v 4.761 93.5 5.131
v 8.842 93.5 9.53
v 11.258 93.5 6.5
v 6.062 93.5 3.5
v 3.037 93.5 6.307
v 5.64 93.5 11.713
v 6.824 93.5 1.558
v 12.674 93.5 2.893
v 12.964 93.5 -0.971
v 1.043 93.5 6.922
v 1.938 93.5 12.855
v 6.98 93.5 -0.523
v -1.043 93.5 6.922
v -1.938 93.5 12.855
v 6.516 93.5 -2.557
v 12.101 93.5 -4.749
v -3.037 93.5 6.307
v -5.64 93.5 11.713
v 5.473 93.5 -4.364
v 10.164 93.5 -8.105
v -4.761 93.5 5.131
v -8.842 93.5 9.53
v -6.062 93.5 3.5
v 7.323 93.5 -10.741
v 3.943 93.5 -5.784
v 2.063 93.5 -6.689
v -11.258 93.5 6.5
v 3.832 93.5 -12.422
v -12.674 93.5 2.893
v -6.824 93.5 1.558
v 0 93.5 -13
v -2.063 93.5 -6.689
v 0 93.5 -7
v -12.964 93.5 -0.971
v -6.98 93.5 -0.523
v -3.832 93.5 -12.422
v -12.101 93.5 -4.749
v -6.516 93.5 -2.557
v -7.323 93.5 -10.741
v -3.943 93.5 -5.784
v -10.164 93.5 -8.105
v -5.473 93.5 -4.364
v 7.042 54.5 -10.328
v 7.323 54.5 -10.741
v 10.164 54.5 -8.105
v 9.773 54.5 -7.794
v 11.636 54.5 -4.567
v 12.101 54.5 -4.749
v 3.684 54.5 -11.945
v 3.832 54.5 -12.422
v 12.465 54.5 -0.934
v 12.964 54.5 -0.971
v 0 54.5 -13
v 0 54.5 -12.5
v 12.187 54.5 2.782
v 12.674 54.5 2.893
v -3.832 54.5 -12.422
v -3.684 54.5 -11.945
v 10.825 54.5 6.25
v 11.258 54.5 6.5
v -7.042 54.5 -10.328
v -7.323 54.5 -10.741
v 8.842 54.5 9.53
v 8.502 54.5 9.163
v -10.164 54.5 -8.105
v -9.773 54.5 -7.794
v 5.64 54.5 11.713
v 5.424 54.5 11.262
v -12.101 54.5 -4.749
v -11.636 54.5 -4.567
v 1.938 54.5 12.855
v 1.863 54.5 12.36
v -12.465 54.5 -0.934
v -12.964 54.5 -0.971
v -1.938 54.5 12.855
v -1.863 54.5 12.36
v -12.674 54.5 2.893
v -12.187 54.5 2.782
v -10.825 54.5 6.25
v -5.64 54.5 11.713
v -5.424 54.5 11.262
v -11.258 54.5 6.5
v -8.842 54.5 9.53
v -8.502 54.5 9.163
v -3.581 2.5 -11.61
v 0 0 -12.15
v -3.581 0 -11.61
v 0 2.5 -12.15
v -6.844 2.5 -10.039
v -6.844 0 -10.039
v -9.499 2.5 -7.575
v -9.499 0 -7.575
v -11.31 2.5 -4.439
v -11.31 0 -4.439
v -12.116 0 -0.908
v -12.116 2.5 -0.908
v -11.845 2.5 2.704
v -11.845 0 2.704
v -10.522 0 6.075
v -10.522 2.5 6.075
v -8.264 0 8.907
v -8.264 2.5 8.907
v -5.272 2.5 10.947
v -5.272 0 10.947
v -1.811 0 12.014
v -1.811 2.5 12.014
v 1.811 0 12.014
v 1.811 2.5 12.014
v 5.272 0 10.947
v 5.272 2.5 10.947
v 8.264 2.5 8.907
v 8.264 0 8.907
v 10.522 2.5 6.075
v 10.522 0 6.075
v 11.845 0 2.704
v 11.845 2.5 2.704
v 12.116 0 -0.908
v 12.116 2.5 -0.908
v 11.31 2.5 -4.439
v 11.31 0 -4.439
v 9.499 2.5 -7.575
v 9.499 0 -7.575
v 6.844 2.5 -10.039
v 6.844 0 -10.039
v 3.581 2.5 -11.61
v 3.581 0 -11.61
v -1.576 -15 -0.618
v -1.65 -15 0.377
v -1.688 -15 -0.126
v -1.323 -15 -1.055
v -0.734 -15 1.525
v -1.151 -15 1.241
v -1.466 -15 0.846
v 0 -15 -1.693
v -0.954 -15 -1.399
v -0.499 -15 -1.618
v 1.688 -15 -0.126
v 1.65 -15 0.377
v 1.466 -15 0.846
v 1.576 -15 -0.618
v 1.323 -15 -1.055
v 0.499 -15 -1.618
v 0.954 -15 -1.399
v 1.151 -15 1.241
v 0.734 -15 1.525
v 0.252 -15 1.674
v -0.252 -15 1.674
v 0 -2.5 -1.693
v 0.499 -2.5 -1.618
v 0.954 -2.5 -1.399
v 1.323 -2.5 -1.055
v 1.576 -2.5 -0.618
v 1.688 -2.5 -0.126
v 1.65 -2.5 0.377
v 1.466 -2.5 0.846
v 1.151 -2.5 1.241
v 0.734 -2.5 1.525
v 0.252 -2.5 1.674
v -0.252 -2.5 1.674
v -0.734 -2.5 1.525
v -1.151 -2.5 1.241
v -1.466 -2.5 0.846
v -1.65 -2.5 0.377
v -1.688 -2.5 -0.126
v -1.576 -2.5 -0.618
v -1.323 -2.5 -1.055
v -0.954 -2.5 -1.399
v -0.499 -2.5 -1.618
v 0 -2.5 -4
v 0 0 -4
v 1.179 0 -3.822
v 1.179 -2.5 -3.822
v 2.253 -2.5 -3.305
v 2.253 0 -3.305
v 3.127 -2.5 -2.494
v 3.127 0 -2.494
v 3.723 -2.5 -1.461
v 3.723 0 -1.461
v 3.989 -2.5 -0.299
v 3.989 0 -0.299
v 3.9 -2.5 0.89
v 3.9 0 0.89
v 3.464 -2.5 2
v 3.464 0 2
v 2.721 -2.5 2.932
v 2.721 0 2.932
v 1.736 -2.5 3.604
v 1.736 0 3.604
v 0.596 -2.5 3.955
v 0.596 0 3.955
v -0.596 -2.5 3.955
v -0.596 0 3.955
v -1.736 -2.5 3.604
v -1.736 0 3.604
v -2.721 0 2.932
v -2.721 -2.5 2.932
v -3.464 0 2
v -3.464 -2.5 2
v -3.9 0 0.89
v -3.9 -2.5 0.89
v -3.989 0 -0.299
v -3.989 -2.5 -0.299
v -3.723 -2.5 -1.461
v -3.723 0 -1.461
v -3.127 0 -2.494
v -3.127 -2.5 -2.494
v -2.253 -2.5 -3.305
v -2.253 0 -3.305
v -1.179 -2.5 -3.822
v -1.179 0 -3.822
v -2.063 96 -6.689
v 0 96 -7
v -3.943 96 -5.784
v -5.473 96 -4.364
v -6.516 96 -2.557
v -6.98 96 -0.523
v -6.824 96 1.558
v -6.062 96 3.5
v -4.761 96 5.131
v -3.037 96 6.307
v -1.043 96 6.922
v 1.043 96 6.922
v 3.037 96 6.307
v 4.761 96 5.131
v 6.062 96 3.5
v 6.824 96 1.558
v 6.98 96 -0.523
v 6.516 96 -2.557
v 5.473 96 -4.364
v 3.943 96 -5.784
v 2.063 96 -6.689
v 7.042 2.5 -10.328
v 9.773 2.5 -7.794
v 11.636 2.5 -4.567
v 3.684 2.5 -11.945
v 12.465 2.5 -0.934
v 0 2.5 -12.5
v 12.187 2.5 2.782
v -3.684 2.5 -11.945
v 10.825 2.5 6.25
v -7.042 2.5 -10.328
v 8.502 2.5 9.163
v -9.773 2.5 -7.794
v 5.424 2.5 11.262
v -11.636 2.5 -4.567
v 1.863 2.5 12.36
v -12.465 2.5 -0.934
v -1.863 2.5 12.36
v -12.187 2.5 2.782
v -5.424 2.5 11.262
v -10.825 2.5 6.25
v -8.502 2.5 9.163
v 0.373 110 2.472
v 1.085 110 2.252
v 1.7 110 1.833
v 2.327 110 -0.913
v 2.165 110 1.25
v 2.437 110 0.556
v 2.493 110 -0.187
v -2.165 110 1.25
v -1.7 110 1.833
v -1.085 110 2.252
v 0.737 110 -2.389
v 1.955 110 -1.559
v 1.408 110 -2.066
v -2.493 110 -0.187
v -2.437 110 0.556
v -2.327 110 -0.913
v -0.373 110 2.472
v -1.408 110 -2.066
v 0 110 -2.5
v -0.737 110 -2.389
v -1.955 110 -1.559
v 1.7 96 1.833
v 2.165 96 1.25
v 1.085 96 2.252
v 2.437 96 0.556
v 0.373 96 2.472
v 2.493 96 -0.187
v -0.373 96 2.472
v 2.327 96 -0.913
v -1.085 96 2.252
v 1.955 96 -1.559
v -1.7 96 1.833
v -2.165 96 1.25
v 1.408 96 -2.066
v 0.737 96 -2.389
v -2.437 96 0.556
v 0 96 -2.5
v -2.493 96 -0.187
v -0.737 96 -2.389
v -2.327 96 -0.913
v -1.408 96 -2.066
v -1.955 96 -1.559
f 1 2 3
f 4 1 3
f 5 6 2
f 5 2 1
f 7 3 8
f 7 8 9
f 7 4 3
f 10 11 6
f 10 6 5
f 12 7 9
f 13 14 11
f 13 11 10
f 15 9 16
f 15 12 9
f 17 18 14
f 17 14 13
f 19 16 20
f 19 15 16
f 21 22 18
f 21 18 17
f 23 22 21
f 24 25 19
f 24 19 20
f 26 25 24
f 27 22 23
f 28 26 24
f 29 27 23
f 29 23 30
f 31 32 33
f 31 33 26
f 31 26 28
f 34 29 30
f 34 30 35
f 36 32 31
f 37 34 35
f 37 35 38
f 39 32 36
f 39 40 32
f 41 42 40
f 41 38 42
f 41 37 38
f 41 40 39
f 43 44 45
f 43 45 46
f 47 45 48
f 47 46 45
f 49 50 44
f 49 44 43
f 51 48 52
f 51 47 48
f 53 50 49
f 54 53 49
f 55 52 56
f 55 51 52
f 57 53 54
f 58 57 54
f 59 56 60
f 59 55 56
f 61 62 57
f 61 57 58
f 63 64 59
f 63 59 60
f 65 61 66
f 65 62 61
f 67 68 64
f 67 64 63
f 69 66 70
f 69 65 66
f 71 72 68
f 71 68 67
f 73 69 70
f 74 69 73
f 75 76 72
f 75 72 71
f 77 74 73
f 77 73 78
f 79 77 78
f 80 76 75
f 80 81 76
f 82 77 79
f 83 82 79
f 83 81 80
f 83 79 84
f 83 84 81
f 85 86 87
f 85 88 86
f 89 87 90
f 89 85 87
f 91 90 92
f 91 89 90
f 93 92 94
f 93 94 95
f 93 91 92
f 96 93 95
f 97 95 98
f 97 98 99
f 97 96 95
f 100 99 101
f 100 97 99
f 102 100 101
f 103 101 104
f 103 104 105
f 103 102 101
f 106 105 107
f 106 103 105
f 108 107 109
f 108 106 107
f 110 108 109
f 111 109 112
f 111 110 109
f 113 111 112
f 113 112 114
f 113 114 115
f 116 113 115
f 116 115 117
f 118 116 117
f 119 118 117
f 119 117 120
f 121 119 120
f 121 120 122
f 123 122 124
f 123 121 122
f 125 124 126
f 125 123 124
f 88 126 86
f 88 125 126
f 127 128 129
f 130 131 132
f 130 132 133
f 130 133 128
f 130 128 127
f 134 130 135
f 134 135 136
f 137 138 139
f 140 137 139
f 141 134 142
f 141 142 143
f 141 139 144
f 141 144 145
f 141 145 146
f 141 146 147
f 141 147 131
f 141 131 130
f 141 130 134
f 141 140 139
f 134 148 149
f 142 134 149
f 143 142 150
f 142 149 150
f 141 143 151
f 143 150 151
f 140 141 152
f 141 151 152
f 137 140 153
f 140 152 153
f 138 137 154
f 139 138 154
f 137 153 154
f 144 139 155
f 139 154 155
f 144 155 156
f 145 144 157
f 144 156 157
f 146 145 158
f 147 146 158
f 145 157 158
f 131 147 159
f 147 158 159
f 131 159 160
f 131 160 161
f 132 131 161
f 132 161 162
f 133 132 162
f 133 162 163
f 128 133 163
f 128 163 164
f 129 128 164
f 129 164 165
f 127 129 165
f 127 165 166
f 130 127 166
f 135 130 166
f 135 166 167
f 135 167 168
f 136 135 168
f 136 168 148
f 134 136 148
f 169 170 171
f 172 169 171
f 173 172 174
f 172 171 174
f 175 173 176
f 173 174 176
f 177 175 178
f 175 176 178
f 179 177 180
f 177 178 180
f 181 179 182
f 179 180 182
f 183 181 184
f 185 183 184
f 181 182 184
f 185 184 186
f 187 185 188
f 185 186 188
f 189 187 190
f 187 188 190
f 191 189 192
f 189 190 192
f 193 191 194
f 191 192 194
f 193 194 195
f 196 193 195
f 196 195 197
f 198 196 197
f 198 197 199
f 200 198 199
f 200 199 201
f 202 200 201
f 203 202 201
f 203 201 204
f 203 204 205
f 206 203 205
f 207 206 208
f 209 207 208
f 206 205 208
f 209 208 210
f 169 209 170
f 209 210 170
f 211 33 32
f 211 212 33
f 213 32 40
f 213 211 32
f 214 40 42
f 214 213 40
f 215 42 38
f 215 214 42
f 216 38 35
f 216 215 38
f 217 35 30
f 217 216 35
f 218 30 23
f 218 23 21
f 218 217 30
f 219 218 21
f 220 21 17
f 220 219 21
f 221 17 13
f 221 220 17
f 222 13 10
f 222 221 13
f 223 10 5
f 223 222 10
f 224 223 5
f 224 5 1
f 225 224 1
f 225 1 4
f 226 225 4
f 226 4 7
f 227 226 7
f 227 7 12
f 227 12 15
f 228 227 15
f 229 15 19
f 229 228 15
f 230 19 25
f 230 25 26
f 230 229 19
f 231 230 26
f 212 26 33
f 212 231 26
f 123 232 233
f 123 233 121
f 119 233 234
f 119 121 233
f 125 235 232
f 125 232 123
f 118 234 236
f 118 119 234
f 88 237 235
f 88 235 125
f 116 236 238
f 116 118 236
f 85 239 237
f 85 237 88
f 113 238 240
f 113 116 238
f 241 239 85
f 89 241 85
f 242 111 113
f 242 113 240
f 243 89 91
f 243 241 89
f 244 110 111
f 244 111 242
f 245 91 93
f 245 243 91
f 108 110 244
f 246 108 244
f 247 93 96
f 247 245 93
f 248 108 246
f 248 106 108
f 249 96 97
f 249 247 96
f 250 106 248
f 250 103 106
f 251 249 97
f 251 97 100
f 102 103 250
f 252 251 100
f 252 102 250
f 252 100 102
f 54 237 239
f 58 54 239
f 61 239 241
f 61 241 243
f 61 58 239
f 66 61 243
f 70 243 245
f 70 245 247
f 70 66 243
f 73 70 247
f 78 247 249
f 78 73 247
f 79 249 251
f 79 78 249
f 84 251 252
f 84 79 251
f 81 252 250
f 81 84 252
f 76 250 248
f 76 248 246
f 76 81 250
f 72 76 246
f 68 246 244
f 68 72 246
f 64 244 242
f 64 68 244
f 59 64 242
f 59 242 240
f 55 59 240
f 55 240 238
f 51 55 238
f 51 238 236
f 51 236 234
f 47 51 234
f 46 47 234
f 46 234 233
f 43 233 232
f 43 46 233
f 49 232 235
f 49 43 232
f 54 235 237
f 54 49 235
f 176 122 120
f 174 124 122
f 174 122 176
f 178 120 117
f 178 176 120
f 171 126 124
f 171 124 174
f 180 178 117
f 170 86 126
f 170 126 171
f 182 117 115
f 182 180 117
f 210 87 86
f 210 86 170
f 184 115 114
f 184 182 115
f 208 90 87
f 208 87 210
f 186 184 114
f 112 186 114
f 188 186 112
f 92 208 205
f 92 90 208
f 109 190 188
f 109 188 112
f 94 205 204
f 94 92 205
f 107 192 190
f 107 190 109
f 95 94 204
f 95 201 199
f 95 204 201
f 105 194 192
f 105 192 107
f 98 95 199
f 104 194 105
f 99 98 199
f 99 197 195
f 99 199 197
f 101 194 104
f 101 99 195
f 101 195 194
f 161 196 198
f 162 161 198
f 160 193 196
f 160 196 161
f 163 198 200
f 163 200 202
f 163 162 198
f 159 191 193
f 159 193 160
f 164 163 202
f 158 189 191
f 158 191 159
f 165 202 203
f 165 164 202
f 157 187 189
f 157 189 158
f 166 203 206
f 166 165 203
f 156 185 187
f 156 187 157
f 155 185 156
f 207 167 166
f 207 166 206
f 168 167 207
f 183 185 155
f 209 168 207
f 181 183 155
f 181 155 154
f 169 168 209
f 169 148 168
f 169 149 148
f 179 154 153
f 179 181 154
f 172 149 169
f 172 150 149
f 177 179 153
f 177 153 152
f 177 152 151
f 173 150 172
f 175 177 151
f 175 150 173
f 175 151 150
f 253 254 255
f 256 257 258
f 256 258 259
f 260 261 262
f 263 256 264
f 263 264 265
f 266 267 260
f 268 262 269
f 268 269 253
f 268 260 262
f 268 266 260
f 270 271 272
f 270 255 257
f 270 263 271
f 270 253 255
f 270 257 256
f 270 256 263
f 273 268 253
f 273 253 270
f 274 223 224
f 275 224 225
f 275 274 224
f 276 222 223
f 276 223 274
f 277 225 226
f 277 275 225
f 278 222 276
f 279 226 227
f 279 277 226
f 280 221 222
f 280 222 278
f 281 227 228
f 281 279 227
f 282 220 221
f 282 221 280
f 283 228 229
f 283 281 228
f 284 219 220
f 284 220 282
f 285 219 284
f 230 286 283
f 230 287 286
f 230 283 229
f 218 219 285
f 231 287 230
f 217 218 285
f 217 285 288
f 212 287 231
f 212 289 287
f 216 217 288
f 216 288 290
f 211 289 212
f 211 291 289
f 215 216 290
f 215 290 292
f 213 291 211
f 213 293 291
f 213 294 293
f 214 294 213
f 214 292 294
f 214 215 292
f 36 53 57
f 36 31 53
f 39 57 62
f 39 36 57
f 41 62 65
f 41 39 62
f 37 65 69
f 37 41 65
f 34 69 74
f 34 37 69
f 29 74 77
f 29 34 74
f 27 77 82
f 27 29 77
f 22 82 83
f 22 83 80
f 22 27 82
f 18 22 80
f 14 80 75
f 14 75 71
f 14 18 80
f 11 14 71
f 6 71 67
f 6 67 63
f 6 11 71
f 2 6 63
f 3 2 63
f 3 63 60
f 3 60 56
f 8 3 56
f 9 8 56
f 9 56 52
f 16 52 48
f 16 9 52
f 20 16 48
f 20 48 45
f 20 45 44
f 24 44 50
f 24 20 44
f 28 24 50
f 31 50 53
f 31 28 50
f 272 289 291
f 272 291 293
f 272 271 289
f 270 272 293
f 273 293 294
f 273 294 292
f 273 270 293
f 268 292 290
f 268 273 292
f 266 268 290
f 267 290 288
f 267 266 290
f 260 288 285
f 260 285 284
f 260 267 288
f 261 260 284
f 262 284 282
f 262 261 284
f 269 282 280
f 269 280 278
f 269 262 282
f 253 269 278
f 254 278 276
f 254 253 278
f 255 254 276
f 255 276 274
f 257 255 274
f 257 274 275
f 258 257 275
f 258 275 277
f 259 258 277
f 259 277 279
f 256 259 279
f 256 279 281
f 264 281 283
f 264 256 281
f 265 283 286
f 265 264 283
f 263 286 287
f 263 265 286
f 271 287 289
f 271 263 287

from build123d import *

# Parameters (mm, degrees)
ESQUISSE2_R        = 1.692758077
BOSS_EXTRU_1_DEPTH = 15
ESQUISSE3_R        = 4
BOSS_EXTRU_2_DEPTH = 2.5


with BuildPart() as part:
    # Esquisse1 → Révolution1 (revolve)
    with BuildSketch(Plane.XY, mode=Mode.PRIVATE) as r_volution1_sk:
        Polygon((0, 0), (12.15, 0), (12.15, 2.5), (12.5, 2.5), (12.5, 54.5), (13, 54.5), (13, 93.5), (7, 93.5), (7, 96), (2.5, 96), (2.5, 110), (0, 110), align=None)
    revolve(r_volution1_sk.sketch.rotate(Axis((0, 0, 0), (0, 1, 0)), 90), axis=Axis((0, 0, 0), (0, 1, 0)))

    # Esquisse2 → Boss.-Extru.1 (add)
    with BuildSketch(Plane.XZ):
        with Locations(Location((0, 0, 0), (0, 0, 270))):
            Circle(ESQUISSE2_R)
    extrude(amount=BOSS_EXTRU_1_DEPTH)

    # Esquisse3 → Boss.-Extru.2 (add)
    with BuildSketch(Plane.XZ):
        with Locations(Location((0, 0, 0), (0, 0, 270))):
            Circle(ESQUISSE3_R)
    extrude(amount=BOSS_EXTRU_2_DEPTH)


solid = part.part
